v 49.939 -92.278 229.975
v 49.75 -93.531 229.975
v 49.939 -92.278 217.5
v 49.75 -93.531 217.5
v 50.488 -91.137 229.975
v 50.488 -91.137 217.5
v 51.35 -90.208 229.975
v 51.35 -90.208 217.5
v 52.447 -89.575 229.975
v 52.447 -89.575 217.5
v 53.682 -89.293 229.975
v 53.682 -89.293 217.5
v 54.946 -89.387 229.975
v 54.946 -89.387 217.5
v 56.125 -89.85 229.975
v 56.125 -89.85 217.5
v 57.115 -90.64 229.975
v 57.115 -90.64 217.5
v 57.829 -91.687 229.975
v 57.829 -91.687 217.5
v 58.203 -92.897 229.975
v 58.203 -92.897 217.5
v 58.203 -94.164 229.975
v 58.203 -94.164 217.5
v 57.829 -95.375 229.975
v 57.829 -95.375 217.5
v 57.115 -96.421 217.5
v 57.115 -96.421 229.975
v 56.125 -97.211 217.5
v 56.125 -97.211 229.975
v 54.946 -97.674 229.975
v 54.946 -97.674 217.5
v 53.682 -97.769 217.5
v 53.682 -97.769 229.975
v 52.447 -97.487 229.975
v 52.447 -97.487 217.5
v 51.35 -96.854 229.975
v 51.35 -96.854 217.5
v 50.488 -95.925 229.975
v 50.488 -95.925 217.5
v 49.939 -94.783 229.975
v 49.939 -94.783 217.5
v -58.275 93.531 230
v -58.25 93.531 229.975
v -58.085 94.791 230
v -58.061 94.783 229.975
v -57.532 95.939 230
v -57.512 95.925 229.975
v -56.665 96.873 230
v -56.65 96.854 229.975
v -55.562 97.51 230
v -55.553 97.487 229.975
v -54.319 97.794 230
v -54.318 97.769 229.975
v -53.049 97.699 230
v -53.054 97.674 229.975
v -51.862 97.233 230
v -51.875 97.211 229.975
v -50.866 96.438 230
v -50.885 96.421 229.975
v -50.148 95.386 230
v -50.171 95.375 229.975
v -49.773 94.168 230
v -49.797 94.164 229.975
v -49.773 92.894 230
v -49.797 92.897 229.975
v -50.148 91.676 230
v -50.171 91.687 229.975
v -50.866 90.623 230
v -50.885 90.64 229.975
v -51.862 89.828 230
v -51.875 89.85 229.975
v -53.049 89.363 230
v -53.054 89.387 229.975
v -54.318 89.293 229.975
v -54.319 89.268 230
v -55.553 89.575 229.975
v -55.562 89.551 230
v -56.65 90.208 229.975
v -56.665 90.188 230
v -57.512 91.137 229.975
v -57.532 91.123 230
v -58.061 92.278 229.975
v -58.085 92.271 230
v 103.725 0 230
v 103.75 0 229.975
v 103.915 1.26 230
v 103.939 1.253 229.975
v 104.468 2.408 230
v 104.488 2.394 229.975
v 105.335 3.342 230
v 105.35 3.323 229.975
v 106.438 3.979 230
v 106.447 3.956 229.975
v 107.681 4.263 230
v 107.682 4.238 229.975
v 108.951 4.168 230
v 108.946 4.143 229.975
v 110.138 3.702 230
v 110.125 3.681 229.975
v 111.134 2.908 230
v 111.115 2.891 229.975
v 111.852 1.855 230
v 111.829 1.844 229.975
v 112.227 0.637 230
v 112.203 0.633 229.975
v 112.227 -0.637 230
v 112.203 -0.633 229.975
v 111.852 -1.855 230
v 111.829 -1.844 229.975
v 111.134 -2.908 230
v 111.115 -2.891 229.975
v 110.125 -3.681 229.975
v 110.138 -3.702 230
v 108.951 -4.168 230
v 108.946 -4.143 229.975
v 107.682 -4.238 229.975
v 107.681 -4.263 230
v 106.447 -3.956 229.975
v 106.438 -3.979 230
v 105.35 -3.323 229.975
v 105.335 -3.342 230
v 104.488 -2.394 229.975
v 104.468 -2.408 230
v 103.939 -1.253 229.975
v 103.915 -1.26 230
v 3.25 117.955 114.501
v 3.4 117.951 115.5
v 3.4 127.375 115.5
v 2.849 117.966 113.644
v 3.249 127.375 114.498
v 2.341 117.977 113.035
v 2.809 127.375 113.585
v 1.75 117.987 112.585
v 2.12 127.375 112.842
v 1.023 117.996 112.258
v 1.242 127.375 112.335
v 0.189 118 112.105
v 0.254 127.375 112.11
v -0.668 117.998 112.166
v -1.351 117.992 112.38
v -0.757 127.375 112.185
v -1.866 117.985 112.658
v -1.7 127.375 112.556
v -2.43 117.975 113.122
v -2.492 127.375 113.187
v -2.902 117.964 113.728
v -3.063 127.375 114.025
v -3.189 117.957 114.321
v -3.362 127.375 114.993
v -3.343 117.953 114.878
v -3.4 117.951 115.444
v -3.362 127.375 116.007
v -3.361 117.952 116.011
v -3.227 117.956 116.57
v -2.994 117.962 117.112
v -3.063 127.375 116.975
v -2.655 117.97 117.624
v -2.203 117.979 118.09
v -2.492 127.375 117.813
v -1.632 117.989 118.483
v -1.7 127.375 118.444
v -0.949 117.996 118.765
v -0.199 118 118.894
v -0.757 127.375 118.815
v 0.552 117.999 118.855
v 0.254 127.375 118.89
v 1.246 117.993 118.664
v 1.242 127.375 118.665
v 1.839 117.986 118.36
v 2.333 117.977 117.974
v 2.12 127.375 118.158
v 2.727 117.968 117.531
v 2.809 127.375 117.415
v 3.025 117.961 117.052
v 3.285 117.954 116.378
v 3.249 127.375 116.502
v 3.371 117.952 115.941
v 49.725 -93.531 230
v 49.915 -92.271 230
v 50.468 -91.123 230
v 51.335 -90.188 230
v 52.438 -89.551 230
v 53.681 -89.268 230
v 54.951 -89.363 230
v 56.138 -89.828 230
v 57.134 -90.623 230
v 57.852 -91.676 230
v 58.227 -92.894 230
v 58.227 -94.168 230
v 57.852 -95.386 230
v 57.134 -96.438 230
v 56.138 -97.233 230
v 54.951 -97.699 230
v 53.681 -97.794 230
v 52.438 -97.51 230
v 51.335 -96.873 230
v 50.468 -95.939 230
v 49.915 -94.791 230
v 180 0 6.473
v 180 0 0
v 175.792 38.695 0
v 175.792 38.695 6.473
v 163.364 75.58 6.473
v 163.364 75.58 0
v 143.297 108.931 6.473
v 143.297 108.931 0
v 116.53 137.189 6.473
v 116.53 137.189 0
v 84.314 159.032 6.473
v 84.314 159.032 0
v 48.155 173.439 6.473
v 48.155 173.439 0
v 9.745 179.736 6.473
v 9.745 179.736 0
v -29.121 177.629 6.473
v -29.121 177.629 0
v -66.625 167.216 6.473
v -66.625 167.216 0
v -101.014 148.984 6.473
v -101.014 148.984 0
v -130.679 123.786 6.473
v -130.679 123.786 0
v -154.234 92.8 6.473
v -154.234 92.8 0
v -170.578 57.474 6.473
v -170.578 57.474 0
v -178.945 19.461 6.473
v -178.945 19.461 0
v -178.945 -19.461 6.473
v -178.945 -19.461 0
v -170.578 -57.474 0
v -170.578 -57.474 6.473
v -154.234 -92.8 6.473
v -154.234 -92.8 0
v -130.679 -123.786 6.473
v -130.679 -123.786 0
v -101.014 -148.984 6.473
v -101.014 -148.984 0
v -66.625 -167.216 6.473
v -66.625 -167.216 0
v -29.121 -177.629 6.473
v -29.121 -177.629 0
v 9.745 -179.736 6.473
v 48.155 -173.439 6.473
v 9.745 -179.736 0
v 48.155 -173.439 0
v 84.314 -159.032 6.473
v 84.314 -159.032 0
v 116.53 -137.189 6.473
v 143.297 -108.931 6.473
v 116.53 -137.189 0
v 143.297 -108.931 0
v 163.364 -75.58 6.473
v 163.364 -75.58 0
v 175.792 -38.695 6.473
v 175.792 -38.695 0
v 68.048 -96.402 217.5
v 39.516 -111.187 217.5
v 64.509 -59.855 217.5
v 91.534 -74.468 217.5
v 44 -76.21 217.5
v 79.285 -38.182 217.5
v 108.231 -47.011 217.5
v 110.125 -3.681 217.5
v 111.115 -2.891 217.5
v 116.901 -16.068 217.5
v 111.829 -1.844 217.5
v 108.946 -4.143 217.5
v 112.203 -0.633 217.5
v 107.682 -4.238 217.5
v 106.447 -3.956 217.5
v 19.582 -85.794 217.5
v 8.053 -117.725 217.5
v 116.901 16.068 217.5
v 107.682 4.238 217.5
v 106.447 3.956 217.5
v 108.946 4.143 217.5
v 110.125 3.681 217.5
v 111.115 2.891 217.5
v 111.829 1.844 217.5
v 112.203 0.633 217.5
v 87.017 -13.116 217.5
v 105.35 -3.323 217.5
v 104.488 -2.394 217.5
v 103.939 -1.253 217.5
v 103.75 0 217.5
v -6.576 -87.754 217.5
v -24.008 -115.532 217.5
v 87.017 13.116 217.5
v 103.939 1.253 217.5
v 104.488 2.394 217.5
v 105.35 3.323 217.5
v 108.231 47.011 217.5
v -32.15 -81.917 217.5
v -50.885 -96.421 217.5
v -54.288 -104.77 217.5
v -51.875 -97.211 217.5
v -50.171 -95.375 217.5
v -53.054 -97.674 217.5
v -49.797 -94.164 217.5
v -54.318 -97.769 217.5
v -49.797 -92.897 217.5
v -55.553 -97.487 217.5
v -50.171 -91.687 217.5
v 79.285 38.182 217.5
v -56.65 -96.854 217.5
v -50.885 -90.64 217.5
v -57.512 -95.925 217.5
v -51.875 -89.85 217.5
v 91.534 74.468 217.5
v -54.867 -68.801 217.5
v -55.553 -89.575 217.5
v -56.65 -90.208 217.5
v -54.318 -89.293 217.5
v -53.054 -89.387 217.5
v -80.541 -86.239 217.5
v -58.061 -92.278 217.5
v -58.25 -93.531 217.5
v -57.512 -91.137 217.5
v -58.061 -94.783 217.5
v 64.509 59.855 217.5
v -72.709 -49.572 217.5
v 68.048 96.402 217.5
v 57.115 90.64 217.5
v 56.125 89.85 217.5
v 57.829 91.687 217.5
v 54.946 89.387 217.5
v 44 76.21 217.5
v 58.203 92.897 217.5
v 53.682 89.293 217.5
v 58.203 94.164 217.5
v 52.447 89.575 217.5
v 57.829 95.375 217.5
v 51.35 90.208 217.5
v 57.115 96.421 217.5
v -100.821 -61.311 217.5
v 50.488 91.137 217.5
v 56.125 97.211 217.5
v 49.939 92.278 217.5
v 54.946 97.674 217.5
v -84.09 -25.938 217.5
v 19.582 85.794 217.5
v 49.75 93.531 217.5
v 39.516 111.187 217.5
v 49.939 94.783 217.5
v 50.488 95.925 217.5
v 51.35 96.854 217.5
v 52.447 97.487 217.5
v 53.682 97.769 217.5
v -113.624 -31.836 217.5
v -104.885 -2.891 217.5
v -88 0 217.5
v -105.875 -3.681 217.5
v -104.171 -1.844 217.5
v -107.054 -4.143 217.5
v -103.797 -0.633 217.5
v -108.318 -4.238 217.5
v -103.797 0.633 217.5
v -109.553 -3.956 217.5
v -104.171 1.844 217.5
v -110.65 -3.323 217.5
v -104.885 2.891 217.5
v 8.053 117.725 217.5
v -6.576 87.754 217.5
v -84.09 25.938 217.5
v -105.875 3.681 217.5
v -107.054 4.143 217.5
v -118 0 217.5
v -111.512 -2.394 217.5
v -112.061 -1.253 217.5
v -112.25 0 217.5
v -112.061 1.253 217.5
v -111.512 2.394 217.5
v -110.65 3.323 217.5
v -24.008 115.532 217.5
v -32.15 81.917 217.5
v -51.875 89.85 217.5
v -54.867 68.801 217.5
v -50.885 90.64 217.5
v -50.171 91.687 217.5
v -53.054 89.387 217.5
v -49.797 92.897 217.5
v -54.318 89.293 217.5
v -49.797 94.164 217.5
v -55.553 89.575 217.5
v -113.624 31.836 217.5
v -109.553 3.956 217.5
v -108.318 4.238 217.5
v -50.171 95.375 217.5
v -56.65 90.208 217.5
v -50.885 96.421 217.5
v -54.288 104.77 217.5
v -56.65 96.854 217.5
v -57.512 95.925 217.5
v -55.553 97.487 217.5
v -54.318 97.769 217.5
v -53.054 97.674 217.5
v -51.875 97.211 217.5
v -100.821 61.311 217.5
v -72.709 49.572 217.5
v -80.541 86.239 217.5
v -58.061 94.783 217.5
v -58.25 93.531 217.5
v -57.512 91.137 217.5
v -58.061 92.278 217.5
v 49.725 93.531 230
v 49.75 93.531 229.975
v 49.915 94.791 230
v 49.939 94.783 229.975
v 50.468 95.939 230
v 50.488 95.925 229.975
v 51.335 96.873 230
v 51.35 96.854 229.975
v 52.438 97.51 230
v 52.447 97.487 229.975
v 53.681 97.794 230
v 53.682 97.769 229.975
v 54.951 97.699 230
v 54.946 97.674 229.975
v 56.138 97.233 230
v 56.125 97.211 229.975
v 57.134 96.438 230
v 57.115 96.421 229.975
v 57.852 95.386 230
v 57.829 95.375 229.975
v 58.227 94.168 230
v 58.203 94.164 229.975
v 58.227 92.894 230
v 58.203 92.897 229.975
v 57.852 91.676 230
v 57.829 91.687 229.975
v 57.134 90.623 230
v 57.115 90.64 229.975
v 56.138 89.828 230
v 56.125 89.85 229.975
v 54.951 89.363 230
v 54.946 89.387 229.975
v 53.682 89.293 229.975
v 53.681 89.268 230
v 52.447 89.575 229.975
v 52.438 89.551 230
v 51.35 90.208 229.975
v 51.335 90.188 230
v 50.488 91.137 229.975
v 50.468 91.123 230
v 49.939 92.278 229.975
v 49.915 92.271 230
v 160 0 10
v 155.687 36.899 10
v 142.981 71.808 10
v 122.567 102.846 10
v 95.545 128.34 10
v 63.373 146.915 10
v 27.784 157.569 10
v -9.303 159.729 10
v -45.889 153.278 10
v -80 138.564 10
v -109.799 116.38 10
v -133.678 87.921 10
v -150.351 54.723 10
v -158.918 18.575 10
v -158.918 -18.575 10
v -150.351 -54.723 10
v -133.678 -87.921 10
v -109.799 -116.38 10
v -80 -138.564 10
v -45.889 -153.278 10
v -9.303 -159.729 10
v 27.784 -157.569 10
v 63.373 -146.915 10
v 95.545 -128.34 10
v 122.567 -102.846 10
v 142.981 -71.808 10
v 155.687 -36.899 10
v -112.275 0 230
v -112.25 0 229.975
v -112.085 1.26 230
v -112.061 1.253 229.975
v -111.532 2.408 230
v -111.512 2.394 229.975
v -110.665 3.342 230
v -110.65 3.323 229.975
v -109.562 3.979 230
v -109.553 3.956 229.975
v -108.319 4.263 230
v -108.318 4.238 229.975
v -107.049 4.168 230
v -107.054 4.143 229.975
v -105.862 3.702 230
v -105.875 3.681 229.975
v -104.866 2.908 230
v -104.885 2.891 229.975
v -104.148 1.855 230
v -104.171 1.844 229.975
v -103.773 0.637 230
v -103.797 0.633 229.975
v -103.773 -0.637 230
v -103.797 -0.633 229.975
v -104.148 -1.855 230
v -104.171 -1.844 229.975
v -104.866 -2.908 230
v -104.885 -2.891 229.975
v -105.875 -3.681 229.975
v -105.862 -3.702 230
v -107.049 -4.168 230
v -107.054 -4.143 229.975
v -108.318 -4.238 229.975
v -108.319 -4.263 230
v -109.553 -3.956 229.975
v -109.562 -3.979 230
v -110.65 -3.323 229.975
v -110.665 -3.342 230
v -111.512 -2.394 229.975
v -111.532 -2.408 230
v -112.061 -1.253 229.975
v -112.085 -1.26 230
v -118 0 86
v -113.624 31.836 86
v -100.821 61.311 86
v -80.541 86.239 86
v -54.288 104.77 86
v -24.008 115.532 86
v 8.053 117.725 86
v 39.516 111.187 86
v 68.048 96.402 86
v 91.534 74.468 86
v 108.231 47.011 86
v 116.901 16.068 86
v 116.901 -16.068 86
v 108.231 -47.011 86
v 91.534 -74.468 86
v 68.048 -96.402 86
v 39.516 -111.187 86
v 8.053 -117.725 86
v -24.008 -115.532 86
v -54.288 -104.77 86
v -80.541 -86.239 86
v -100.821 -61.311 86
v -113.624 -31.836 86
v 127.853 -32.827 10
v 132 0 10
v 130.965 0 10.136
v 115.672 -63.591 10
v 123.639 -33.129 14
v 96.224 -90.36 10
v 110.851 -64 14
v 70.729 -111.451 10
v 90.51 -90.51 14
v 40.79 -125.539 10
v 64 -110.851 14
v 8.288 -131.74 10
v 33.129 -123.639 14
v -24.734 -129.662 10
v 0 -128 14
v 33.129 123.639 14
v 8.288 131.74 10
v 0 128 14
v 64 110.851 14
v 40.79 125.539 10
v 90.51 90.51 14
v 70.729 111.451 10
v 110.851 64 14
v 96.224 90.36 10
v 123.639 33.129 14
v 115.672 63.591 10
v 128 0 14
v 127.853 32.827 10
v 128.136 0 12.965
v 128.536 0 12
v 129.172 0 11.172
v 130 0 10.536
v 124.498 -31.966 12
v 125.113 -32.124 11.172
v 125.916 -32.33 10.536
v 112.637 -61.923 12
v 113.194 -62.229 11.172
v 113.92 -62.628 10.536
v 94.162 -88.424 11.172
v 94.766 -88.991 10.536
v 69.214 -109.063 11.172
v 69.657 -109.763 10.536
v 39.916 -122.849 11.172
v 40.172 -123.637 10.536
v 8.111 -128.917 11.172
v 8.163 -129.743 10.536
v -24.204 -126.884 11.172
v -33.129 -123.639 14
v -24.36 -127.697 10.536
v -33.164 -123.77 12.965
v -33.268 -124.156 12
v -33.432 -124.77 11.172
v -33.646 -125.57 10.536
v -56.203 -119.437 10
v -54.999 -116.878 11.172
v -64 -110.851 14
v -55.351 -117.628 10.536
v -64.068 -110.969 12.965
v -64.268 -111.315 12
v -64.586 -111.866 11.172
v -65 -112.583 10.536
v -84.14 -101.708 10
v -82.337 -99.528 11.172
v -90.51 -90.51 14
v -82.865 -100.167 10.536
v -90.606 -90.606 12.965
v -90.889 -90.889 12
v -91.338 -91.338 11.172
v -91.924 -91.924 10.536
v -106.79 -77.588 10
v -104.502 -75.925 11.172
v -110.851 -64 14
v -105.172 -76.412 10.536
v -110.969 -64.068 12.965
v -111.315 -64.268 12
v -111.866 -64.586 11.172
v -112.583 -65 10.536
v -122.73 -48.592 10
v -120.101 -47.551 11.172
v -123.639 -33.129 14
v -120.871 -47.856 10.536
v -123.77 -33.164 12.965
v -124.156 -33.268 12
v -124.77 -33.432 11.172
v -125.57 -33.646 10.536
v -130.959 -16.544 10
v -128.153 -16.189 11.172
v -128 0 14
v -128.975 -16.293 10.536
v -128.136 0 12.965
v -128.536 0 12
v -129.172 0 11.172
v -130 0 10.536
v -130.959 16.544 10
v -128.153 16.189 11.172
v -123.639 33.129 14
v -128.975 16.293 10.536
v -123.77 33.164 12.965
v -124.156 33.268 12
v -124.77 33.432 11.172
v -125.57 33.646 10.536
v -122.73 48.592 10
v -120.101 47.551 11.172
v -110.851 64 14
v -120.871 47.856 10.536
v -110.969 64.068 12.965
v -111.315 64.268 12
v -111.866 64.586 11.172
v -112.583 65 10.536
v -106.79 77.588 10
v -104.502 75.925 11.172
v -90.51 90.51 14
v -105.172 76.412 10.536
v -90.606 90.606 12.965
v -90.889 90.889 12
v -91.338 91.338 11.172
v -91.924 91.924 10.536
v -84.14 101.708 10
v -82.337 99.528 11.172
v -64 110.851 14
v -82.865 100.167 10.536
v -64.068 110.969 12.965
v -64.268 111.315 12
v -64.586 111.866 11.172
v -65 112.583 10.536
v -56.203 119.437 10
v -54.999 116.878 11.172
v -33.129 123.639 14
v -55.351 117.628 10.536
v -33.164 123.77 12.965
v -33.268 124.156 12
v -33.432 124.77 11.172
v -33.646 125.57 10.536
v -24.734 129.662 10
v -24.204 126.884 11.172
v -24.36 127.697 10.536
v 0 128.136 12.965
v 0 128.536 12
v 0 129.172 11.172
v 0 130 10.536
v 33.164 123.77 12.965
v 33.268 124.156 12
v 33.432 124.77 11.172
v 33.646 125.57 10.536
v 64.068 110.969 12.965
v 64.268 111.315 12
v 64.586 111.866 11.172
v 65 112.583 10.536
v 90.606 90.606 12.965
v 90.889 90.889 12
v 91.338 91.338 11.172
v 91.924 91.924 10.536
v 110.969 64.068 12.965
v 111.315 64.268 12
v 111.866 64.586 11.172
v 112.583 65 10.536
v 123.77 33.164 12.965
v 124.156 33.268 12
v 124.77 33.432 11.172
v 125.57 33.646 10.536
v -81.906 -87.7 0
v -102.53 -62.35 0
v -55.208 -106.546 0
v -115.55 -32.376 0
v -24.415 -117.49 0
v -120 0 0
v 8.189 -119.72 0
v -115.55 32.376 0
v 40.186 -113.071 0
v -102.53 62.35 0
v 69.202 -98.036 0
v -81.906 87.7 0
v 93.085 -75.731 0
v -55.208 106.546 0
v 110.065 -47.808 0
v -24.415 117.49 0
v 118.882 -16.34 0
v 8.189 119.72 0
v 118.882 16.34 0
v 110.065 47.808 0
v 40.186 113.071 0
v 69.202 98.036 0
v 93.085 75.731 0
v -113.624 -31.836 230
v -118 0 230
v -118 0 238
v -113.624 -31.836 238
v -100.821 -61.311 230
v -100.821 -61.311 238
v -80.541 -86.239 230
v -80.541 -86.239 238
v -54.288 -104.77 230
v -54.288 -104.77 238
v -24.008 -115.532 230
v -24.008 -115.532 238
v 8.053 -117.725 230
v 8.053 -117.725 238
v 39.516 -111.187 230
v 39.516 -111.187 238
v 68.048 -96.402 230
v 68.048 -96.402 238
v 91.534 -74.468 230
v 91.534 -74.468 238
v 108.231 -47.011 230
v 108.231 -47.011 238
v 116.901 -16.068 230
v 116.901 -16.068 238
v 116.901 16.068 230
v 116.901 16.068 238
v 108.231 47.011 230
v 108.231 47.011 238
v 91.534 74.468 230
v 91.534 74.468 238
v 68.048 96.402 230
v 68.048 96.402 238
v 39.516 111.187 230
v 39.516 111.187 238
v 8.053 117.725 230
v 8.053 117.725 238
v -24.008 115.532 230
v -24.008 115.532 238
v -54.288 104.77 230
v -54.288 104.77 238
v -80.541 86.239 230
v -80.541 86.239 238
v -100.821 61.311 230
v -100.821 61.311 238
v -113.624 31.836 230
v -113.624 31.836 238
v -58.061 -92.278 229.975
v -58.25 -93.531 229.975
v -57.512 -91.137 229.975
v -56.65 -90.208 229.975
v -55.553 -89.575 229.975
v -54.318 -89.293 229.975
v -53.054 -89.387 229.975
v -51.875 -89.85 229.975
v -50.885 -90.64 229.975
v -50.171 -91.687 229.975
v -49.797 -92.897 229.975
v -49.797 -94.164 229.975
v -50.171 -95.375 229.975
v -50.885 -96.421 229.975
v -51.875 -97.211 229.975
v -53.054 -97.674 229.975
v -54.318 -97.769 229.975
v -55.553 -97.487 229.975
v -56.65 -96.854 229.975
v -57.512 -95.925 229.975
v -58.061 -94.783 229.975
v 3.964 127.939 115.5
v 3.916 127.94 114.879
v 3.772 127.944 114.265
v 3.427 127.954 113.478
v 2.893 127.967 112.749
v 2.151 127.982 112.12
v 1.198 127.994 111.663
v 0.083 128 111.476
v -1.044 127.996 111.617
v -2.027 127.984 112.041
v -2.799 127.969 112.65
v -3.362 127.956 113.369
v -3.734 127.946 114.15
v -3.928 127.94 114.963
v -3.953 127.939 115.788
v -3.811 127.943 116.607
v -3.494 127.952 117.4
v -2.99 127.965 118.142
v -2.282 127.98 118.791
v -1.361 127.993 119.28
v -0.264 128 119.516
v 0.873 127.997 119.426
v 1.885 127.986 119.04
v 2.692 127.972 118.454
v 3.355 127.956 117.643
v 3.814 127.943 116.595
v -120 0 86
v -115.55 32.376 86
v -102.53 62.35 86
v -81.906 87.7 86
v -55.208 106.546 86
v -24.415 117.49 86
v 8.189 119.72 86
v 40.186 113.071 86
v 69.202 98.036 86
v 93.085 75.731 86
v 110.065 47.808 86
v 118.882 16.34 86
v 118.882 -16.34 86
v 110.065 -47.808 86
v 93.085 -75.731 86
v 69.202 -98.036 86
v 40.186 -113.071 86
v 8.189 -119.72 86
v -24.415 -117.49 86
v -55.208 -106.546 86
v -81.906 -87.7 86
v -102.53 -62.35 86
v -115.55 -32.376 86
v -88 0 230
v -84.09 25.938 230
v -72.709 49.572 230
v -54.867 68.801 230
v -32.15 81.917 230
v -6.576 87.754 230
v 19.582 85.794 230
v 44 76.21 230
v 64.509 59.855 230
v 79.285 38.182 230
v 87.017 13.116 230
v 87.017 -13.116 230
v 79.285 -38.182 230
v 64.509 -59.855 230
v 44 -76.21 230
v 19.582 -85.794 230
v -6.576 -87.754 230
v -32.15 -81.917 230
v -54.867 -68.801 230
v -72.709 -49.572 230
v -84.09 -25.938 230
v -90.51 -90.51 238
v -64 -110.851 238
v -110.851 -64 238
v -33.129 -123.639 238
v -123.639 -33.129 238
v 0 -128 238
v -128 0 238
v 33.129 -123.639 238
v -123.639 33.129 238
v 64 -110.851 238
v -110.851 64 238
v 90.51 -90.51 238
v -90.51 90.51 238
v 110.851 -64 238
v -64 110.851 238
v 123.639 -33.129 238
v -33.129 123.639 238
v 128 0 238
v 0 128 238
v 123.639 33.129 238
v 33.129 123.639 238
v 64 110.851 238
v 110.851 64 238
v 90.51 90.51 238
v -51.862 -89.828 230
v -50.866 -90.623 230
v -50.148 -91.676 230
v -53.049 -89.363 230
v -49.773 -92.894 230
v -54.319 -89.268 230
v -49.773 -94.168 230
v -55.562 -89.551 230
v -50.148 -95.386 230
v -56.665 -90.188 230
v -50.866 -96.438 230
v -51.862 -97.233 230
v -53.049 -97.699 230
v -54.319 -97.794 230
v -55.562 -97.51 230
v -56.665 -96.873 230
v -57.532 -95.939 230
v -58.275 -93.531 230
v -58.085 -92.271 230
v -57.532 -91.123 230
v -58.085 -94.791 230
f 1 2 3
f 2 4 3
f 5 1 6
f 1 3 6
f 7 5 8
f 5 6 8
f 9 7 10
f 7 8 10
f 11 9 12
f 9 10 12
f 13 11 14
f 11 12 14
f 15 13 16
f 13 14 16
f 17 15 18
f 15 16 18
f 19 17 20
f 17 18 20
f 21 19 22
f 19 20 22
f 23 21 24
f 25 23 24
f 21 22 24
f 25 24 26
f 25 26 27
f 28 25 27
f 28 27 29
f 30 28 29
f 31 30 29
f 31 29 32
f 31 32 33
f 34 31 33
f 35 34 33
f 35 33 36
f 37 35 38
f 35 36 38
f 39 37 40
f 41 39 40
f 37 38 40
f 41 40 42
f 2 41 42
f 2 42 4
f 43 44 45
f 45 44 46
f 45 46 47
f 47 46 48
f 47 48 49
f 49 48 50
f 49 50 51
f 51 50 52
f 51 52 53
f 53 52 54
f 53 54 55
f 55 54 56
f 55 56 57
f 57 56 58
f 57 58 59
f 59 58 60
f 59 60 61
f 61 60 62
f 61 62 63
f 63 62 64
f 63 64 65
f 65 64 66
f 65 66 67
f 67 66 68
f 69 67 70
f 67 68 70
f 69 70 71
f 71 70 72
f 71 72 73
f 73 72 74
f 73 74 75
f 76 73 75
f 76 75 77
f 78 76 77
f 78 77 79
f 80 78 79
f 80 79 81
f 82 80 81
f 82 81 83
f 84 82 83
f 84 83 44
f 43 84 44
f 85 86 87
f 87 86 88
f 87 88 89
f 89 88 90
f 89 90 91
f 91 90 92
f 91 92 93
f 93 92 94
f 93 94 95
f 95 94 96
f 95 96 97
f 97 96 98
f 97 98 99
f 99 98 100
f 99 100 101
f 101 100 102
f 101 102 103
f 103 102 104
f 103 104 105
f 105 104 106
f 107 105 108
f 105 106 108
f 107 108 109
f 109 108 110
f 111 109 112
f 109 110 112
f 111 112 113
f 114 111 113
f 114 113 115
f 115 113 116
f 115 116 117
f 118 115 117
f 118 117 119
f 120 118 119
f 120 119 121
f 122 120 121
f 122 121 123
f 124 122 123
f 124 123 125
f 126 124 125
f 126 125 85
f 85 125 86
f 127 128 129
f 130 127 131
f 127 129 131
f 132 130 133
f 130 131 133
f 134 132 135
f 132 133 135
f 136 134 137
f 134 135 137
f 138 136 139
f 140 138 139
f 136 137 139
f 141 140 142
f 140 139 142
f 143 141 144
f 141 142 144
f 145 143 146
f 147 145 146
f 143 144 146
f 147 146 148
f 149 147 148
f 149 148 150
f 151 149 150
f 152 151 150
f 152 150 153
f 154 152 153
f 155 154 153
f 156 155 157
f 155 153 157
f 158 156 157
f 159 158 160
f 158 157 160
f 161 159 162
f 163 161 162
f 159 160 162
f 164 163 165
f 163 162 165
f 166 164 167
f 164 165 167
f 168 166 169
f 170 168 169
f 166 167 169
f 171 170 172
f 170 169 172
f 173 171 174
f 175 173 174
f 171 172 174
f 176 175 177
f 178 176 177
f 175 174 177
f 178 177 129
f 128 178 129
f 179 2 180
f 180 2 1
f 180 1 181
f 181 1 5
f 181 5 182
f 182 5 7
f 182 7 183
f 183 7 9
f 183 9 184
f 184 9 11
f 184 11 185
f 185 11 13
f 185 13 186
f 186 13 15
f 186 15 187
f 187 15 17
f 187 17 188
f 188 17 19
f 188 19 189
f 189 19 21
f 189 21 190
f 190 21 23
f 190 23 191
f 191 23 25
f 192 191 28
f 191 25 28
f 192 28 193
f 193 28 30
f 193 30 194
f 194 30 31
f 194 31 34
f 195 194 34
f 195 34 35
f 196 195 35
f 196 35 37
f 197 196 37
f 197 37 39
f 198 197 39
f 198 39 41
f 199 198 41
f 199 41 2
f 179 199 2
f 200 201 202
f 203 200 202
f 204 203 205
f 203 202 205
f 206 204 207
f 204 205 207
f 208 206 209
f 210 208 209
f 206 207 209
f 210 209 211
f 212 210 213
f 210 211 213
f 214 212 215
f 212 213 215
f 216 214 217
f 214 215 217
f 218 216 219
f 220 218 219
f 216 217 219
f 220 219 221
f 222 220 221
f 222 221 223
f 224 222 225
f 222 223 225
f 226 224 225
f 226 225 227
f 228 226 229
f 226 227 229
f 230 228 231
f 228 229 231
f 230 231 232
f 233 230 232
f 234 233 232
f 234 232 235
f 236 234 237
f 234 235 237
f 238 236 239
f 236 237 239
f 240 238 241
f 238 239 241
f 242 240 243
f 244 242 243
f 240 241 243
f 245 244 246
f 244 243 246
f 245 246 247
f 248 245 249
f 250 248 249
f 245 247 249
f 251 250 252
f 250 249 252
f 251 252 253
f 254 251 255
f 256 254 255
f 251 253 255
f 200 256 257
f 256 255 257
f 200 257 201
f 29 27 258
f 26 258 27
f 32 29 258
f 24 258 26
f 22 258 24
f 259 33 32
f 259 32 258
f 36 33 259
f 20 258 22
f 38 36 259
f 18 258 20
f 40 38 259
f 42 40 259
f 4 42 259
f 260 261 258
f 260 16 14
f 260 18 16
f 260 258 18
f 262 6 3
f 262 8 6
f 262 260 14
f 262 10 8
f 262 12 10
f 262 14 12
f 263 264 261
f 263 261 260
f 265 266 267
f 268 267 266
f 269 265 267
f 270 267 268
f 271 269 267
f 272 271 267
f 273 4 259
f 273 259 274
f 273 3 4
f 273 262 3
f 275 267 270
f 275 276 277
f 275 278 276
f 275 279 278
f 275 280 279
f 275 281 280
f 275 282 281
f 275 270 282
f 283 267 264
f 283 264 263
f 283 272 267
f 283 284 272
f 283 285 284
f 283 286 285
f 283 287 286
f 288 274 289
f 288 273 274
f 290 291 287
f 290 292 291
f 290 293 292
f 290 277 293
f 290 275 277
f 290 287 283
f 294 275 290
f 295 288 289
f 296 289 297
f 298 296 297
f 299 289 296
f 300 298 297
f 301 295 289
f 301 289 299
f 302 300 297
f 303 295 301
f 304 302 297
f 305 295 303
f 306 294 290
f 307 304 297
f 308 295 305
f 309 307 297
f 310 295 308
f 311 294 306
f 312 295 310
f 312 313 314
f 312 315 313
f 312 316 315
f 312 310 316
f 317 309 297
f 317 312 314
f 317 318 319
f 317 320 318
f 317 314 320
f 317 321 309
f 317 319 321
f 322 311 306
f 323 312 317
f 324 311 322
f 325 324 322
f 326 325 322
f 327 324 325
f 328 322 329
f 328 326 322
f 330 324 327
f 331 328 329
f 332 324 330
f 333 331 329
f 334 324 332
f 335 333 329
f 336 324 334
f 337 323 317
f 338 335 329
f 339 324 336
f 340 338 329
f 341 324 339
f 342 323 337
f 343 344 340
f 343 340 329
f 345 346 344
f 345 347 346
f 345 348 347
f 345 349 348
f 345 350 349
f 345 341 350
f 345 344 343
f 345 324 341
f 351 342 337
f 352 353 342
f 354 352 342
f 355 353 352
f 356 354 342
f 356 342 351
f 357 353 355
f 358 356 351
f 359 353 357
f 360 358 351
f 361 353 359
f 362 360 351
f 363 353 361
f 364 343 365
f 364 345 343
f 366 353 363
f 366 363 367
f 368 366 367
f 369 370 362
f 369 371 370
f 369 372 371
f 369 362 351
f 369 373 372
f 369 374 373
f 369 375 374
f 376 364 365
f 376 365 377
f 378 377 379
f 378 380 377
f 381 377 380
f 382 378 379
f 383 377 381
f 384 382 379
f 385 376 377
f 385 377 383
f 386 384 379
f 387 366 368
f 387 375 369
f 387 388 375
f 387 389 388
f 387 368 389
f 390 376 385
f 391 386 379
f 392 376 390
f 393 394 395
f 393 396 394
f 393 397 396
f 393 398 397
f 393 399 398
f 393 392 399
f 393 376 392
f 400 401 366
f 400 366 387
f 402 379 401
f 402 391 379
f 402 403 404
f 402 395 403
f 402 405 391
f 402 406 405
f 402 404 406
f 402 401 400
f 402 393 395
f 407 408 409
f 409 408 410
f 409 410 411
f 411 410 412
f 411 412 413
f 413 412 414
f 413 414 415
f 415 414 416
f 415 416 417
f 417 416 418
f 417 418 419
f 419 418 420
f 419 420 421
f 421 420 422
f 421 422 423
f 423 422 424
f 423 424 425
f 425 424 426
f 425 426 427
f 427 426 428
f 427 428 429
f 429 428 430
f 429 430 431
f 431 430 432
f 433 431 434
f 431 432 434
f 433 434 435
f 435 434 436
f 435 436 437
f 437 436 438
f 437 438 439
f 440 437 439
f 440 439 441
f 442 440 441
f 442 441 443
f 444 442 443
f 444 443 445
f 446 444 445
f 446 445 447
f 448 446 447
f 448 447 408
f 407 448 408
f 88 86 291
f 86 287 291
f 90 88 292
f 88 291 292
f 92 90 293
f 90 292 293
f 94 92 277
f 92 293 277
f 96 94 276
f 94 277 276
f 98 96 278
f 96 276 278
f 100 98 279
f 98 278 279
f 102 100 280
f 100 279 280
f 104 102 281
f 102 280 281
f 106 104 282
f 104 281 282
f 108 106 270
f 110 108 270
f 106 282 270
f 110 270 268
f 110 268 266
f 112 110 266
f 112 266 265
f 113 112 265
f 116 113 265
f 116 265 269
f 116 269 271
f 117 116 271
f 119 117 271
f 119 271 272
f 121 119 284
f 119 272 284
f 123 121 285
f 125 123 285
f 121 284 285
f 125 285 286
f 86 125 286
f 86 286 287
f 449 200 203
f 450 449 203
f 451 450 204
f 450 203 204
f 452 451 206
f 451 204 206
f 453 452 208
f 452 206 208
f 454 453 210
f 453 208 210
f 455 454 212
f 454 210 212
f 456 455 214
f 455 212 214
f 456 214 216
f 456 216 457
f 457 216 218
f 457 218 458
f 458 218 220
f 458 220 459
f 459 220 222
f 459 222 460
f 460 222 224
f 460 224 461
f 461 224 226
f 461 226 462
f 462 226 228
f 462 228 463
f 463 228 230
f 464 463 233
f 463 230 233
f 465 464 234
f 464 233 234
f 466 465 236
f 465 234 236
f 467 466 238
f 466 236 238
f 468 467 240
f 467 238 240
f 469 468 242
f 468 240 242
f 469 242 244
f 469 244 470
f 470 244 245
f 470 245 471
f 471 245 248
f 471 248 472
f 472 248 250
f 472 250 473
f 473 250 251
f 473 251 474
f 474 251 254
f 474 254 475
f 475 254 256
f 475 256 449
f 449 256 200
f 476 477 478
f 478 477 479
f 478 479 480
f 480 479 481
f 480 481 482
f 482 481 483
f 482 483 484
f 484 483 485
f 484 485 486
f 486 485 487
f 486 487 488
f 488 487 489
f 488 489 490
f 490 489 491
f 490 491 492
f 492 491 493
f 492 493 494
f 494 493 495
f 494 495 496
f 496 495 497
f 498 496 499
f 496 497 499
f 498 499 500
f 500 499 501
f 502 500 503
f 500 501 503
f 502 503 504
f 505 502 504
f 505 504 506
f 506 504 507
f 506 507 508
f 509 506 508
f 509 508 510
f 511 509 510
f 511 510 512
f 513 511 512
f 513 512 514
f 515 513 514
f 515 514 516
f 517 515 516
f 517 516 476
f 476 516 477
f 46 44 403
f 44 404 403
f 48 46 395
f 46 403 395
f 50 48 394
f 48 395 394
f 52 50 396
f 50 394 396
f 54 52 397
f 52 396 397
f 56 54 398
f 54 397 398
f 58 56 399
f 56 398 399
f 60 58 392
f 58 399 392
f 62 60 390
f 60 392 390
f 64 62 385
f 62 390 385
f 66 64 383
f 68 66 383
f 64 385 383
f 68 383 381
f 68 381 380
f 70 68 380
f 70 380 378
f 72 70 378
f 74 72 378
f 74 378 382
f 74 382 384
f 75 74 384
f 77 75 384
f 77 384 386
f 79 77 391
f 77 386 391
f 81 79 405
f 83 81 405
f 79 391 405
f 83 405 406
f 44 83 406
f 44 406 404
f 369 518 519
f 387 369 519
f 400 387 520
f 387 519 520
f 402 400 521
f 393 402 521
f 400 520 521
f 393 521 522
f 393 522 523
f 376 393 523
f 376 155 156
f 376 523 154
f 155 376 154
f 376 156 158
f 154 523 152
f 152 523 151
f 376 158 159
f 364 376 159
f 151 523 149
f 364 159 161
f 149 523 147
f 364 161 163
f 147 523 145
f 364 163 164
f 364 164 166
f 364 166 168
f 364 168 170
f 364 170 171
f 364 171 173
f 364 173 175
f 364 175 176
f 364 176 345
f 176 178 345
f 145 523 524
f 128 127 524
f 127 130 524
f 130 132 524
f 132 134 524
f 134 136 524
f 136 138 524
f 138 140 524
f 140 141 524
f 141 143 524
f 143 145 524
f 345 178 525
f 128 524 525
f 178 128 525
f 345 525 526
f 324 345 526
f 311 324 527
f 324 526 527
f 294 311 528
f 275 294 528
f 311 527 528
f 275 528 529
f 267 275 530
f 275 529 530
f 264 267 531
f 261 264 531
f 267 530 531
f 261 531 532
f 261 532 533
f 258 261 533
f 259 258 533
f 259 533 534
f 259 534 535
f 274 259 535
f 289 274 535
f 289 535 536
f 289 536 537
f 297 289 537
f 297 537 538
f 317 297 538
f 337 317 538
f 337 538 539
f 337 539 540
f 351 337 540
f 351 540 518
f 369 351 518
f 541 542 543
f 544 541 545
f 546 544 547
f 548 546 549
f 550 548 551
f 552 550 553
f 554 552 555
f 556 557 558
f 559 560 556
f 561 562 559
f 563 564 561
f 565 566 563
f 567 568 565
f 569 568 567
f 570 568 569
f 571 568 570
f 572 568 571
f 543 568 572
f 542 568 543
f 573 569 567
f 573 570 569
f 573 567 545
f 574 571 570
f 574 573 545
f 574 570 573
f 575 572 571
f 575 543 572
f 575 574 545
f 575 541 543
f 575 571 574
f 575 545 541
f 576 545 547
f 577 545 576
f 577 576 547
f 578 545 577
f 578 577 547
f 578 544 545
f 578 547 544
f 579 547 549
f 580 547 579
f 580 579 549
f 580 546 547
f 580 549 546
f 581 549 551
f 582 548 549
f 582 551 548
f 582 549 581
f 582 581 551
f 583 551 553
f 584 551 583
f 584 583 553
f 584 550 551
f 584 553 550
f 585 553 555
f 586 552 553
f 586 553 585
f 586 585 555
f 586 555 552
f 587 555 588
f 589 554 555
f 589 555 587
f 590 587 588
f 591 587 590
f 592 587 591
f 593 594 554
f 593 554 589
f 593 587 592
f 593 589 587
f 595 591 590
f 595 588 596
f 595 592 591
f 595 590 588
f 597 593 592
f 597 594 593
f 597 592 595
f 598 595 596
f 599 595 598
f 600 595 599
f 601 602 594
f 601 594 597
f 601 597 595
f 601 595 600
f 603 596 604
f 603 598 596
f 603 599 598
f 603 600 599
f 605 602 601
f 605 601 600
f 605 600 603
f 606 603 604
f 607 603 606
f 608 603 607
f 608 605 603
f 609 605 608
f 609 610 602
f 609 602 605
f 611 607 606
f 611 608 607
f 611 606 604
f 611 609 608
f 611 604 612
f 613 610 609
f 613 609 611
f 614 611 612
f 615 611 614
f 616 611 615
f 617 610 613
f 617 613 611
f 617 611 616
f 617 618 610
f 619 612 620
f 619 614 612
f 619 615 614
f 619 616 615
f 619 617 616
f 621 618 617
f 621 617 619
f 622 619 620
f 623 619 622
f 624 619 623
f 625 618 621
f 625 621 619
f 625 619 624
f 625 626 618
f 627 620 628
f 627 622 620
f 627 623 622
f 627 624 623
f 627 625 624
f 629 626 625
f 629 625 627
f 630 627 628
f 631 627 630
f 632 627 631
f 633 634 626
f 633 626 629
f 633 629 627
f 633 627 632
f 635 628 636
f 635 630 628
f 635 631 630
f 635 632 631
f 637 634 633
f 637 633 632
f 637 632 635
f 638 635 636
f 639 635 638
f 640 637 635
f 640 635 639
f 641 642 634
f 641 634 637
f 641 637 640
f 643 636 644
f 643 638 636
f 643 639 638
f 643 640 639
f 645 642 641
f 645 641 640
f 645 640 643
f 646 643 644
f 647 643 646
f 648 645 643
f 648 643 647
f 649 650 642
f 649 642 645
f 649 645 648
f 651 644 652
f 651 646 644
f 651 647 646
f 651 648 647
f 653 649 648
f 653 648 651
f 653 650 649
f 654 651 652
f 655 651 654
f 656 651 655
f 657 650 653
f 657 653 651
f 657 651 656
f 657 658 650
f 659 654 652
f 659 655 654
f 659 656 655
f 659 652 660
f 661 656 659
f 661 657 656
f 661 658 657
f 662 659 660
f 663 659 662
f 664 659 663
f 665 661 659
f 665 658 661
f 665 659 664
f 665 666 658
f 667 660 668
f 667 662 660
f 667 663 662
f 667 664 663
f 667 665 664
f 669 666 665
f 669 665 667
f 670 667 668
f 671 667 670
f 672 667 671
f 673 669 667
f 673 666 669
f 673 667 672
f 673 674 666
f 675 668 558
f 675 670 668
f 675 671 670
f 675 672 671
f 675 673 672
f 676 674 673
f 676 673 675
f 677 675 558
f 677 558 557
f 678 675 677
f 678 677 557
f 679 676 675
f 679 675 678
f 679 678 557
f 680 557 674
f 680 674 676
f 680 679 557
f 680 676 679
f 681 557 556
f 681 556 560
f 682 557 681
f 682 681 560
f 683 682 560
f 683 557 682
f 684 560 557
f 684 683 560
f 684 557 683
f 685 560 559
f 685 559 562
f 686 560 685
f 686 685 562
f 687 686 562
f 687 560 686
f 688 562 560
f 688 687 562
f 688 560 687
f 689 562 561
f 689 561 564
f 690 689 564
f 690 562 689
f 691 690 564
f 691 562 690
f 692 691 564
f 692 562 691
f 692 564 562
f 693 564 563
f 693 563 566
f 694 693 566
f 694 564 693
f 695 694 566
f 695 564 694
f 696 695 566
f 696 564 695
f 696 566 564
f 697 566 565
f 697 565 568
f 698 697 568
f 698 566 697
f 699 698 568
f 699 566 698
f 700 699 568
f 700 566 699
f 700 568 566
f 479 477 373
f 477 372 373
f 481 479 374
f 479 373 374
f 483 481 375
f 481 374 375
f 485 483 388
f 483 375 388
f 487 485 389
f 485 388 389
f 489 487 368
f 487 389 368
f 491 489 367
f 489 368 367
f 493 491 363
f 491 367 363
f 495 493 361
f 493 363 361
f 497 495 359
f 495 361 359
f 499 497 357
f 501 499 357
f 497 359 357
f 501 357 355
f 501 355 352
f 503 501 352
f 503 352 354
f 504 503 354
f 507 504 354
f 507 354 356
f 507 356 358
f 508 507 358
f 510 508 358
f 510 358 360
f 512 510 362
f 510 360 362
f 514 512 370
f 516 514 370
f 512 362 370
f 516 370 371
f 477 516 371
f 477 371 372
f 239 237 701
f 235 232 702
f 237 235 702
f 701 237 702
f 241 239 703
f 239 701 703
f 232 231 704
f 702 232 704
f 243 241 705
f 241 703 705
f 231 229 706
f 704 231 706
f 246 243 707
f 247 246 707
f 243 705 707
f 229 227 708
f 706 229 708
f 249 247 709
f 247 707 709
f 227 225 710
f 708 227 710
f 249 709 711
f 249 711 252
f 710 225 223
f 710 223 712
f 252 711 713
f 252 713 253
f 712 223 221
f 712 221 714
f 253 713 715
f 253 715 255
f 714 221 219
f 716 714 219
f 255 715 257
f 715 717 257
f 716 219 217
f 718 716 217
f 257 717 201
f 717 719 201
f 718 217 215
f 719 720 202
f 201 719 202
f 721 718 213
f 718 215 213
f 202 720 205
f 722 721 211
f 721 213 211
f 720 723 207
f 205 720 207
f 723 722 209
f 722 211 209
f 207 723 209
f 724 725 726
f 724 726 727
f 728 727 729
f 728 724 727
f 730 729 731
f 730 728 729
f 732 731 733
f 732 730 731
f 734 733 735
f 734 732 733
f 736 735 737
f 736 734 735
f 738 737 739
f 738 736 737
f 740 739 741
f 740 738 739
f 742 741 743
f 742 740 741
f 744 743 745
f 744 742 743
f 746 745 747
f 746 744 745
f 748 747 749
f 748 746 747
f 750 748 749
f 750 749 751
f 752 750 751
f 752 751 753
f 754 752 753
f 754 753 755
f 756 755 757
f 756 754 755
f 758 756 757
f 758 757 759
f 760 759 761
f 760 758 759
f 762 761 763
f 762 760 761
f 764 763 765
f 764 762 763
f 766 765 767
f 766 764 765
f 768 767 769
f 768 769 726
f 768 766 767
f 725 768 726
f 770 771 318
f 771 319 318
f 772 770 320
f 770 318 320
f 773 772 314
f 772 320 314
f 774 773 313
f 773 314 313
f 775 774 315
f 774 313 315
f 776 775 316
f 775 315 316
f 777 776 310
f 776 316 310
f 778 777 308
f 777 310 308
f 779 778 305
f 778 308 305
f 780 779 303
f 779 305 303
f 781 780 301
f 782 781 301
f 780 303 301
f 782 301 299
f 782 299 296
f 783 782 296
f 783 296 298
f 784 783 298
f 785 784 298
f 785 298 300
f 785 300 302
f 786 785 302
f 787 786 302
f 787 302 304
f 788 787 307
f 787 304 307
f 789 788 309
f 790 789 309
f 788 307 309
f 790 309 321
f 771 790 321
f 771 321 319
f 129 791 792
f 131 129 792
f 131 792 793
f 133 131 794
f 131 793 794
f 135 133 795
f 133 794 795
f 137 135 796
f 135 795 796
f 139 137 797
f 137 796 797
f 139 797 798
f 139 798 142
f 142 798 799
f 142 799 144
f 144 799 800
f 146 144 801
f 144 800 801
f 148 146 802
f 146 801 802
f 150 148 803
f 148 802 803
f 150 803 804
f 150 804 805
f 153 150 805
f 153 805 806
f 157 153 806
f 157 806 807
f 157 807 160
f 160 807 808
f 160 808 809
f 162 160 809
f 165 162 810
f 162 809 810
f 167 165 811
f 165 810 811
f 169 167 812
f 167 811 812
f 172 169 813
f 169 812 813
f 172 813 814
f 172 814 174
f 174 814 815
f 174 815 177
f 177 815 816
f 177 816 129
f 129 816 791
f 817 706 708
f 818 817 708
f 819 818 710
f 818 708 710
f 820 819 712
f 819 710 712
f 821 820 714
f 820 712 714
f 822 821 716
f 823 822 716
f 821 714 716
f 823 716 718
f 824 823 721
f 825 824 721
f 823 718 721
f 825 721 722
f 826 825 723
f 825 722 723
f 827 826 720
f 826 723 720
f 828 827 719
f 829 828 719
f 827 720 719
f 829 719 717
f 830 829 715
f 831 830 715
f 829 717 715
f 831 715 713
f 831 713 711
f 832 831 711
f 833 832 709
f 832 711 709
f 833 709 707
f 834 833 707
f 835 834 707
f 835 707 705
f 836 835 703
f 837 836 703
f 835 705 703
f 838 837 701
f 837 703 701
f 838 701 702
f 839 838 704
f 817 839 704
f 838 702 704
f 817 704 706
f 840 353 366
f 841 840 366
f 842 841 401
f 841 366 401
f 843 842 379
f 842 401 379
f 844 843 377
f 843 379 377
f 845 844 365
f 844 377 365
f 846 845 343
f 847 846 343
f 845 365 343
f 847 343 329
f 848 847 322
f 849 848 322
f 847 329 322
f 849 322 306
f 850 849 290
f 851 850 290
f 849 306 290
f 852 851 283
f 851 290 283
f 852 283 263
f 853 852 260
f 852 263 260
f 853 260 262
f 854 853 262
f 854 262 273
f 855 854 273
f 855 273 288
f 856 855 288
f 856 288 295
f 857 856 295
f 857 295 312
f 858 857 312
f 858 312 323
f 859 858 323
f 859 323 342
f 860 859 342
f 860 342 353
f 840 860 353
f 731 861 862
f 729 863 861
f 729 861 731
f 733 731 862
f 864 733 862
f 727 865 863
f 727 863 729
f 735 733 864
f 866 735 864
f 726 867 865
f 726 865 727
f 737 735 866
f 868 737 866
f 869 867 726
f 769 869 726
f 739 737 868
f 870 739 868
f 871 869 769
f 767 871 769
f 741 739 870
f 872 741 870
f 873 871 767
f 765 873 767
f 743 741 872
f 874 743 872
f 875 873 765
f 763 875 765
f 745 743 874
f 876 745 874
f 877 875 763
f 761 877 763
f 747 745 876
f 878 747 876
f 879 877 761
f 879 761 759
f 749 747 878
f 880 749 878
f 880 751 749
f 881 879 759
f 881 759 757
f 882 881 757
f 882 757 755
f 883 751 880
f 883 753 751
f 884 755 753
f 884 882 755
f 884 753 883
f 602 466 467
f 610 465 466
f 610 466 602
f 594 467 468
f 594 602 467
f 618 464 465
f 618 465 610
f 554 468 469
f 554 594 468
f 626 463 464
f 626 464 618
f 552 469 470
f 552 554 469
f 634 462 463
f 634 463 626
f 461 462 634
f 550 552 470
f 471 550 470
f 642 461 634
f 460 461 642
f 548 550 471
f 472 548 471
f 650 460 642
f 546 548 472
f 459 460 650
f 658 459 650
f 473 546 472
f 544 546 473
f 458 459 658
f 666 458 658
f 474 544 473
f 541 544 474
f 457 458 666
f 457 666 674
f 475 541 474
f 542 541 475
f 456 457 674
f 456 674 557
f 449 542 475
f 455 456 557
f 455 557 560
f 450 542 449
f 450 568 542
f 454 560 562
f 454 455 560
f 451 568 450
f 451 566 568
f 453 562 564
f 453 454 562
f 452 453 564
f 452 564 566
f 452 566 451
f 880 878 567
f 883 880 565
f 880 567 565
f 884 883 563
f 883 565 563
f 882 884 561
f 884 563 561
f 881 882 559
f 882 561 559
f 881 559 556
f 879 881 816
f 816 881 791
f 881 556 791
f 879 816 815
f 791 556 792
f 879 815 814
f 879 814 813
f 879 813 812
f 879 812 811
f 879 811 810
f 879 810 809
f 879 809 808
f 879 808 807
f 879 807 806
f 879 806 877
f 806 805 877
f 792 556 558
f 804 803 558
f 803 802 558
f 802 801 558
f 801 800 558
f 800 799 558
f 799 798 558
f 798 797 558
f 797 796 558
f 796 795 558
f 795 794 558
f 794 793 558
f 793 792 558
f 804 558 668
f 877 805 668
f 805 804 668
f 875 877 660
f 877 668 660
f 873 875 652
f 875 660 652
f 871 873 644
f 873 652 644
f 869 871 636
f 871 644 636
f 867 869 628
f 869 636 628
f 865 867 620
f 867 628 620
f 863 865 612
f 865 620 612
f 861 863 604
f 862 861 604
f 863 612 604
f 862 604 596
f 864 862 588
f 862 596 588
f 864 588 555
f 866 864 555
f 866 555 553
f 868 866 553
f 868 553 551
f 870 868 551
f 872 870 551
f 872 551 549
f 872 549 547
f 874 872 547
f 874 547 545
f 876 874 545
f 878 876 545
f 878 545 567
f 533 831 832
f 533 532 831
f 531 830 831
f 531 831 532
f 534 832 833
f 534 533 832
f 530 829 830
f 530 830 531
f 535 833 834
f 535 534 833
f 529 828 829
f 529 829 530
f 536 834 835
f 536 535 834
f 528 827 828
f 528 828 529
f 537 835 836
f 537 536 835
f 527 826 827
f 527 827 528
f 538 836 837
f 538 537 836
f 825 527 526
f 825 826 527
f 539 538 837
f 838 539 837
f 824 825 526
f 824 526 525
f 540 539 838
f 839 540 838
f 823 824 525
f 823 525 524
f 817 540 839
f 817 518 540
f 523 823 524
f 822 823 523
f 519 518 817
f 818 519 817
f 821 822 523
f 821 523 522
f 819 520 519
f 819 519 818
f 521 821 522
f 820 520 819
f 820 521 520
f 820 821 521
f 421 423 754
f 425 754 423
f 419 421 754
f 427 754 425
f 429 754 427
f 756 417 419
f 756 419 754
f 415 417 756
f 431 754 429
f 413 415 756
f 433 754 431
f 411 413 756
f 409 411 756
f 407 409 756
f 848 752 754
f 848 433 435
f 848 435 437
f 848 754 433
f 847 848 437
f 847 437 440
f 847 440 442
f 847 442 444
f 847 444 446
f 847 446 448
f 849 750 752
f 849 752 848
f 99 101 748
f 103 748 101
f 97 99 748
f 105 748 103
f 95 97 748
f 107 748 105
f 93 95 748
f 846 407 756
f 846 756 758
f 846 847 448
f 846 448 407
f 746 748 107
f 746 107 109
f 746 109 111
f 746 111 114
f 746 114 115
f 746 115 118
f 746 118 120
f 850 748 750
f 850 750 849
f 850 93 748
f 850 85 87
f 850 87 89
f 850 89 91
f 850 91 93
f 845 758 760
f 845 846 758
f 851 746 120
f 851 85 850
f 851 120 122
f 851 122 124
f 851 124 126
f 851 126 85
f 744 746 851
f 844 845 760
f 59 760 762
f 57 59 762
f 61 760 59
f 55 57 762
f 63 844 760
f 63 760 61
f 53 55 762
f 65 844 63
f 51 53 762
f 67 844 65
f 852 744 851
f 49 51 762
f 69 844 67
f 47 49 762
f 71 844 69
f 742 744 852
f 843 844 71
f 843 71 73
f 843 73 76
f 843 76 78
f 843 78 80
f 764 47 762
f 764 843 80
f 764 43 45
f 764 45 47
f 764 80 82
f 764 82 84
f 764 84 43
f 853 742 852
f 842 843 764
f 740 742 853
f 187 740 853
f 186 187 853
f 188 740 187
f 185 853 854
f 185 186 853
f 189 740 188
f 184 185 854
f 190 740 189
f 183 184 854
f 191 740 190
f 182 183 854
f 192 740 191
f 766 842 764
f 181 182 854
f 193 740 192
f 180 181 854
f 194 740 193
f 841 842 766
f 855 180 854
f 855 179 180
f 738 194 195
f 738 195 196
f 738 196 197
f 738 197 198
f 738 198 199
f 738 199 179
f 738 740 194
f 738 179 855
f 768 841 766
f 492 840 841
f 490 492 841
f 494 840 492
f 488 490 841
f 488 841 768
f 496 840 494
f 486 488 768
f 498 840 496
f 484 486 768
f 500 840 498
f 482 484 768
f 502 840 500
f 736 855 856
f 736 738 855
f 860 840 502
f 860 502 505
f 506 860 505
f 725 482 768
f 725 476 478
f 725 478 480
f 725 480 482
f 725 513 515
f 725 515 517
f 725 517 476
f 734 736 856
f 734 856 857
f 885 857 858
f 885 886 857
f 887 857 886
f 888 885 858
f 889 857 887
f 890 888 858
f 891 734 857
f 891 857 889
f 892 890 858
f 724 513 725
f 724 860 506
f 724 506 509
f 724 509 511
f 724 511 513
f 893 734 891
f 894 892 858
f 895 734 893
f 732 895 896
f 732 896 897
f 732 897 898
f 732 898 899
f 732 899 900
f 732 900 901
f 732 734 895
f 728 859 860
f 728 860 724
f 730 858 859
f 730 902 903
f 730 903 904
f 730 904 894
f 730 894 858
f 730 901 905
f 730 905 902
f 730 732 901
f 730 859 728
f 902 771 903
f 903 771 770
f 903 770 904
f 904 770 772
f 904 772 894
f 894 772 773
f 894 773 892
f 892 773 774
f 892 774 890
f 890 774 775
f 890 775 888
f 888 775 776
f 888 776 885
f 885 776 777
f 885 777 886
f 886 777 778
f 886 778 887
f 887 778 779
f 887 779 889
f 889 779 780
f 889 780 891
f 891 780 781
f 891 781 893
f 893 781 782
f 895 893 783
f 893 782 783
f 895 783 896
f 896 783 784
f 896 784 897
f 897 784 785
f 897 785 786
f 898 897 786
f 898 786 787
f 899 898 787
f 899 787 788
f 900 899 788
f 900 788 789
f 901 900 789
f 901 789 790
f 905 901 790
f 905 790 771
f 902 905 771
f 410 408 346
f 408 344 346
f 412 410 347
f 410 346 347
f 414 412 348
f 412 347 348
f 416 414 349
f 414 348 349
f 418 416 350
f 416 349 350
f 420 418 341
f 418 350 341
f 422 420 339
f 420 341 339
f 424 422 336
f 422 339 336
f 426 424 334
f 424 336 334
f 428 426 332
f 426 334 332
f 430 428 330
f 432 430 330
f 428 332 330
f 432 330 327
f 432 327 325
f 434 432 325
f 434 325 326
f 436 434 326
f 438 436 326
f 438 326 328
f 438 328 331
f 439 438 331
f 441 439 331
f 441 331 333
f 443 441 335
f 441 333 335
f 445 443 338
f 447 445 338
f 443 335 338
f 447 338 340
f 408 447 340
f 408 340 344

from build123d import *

# Parameters (mm, degrees)
SKETCH_1_R                    = 180
EXTRUDE_1_DEPTH               = 10
SKETCH_2_R                    = 128
EXTRUDE_2_DEPTH               = 238
SKETCH_3_R                    = 120
CUT_EXTRUDE_1_DEPTH           = 86
SKETCH_4_R                    = 118
CUT_EXTRUDE_2_DEPTH           = 131.5
SKETCH_5_R                    = 88
CUT_EXTRUDE_3_DEPTH           = 335.822714283
CUT_EXTRUDE_START             = -8
SKETCH_6_R                    = 118
CUT_EXTRUDE_4_DEPTH           = 8
HOLE_WIZARD_M10_1_D           = 8.5
HOLE_WIZARD_M10_1_CSINK_D     = 8.55
HOLE_WIZARD_M10_1_CSINK_ANGLE = 90
FILLET_1_R                    = 4
CHAMFER_1_SIZE                = 20
CHAMFER_1_SIZE2               = 3.526539614


# Read off the part's stored shape, not the designer's step: M8 螺纹孔1
with BuildPart() as part:
    # 草图1 → 凸台-拉伸1 (new body)
    with BuildSketch(Plane.XY):
        Circle(SKETCH_1_R)
    extrude(amount=EXTRUDE_1_DEPTH)

    # 草图2 → 凸台-拉伸2 (add)
    with BuildSketch(Plane.XY):
        Circle(SKETCH_2_R)
    extrude(amount=EXTRUDE_2_DEPTH)

    # 草图3 → 切除-拉伸1 (cut)
    with BuildSketch(Plane(origin=(0, 0, 0), x_dir=(-1, 0, 0), z_dir=(0, 0, -1))):
        Circle(SKETCH_3_R)
    extrude(amount=-CUT_EXTRUDE_1_DEPTH, mode=Mode.SUBTRACT)

    # 草图4 → 切除-拉伸2 (cut)
    with BuildSketch(Plane(origin=(0, 0, 86), x_dir=(-1, 0, 0), z_dir=(0, 0, -1))):
        Circle(SKETCH_4_R)
    extrude(amount=-CUT_EXTRUDE_2_DEPTH, mode=Mode.SUBTRACT)

    # 草图5 → 切除-拉伸3 (cut, through all)
    with BuildSketch(Plane(origin=(0, 0, 217.5), x_dir=(-1, 0, 0), z_dir=(0, 0, -1))):
        Circle(SKETCH_5_R)
    extrude(amount=-CUT_EXTRUDE_3_DEPTH, mode=Mode.SUBTRACT)

    # 草图6 → 切除-拉伸4 (cut)
    with BuildSketch(Plane.XY.offset(238).offset(CUT_EXTRUDE_START)):
        with Locations(Location((0, 0, 0), (0, 0, 180))):
            Circle(SKETCH_6_R)
    extrude(amount=CUT_EXTRUDE_4_DEPTH, mode=Mode.SUBTRACT)

    # M10 螺纹孔的螺纹孔钻头1 (through all)
    with Locations(Plane.XY.offset(230)):
        with Locations((108, 0), (54, -93.530743609), (-54, -93.530743609), (-108, 0), (-54, 93.530743609), (54, 93.530743609)):
            CounterSinkHole(HOLE_WIZARD_M10_1_D / 2, HOLE_WIZARD_M10_1_CSINK_D / 2, counter_sink_angle=HOLE_WIZARD_M10_1_CSINK_ANGLE)

    # 圆角1
    fillet_1_edges = [part.edges().sort_by_distance(p)[0] for p in [
        (-128, 0, 10),
    ]]
    fillet(fillet_1_edges, radius=FILLET_1_R)

    # 倒角1
    chamfer_1_edges = [part.edges().sort_by_distance(p)[0] for p in [
        (-180, 0, 10),
    ]]
    chamfer_1_side = [part.faces().sort_by_distance(p)[0] for p in [
        (-137.091168825, 0, 10),
    ]]
    chamfer(chamfer_1_edges, length=CHAMFER_1_SIZE, length2=CHAMFER_1_SIZE2, reference=chamfer_1_side[0])

    # M8 螺纹孔1 outline → M8 螺纹孔1 (revolve, cut)
    with BuildSketch(Plane.XY.offset(115.5)):
        Polygon((4.025021706, 128.000021706), (0, 128.000021706), (0, 117.951000003), (3.4, 117.951000003), (3.4, 127.375), align=None)
    revolve(axis=Axis((0, 0, 115.5), (0, 1, 0)), mode=Mode.SUBTRACT)


solid = part.part
